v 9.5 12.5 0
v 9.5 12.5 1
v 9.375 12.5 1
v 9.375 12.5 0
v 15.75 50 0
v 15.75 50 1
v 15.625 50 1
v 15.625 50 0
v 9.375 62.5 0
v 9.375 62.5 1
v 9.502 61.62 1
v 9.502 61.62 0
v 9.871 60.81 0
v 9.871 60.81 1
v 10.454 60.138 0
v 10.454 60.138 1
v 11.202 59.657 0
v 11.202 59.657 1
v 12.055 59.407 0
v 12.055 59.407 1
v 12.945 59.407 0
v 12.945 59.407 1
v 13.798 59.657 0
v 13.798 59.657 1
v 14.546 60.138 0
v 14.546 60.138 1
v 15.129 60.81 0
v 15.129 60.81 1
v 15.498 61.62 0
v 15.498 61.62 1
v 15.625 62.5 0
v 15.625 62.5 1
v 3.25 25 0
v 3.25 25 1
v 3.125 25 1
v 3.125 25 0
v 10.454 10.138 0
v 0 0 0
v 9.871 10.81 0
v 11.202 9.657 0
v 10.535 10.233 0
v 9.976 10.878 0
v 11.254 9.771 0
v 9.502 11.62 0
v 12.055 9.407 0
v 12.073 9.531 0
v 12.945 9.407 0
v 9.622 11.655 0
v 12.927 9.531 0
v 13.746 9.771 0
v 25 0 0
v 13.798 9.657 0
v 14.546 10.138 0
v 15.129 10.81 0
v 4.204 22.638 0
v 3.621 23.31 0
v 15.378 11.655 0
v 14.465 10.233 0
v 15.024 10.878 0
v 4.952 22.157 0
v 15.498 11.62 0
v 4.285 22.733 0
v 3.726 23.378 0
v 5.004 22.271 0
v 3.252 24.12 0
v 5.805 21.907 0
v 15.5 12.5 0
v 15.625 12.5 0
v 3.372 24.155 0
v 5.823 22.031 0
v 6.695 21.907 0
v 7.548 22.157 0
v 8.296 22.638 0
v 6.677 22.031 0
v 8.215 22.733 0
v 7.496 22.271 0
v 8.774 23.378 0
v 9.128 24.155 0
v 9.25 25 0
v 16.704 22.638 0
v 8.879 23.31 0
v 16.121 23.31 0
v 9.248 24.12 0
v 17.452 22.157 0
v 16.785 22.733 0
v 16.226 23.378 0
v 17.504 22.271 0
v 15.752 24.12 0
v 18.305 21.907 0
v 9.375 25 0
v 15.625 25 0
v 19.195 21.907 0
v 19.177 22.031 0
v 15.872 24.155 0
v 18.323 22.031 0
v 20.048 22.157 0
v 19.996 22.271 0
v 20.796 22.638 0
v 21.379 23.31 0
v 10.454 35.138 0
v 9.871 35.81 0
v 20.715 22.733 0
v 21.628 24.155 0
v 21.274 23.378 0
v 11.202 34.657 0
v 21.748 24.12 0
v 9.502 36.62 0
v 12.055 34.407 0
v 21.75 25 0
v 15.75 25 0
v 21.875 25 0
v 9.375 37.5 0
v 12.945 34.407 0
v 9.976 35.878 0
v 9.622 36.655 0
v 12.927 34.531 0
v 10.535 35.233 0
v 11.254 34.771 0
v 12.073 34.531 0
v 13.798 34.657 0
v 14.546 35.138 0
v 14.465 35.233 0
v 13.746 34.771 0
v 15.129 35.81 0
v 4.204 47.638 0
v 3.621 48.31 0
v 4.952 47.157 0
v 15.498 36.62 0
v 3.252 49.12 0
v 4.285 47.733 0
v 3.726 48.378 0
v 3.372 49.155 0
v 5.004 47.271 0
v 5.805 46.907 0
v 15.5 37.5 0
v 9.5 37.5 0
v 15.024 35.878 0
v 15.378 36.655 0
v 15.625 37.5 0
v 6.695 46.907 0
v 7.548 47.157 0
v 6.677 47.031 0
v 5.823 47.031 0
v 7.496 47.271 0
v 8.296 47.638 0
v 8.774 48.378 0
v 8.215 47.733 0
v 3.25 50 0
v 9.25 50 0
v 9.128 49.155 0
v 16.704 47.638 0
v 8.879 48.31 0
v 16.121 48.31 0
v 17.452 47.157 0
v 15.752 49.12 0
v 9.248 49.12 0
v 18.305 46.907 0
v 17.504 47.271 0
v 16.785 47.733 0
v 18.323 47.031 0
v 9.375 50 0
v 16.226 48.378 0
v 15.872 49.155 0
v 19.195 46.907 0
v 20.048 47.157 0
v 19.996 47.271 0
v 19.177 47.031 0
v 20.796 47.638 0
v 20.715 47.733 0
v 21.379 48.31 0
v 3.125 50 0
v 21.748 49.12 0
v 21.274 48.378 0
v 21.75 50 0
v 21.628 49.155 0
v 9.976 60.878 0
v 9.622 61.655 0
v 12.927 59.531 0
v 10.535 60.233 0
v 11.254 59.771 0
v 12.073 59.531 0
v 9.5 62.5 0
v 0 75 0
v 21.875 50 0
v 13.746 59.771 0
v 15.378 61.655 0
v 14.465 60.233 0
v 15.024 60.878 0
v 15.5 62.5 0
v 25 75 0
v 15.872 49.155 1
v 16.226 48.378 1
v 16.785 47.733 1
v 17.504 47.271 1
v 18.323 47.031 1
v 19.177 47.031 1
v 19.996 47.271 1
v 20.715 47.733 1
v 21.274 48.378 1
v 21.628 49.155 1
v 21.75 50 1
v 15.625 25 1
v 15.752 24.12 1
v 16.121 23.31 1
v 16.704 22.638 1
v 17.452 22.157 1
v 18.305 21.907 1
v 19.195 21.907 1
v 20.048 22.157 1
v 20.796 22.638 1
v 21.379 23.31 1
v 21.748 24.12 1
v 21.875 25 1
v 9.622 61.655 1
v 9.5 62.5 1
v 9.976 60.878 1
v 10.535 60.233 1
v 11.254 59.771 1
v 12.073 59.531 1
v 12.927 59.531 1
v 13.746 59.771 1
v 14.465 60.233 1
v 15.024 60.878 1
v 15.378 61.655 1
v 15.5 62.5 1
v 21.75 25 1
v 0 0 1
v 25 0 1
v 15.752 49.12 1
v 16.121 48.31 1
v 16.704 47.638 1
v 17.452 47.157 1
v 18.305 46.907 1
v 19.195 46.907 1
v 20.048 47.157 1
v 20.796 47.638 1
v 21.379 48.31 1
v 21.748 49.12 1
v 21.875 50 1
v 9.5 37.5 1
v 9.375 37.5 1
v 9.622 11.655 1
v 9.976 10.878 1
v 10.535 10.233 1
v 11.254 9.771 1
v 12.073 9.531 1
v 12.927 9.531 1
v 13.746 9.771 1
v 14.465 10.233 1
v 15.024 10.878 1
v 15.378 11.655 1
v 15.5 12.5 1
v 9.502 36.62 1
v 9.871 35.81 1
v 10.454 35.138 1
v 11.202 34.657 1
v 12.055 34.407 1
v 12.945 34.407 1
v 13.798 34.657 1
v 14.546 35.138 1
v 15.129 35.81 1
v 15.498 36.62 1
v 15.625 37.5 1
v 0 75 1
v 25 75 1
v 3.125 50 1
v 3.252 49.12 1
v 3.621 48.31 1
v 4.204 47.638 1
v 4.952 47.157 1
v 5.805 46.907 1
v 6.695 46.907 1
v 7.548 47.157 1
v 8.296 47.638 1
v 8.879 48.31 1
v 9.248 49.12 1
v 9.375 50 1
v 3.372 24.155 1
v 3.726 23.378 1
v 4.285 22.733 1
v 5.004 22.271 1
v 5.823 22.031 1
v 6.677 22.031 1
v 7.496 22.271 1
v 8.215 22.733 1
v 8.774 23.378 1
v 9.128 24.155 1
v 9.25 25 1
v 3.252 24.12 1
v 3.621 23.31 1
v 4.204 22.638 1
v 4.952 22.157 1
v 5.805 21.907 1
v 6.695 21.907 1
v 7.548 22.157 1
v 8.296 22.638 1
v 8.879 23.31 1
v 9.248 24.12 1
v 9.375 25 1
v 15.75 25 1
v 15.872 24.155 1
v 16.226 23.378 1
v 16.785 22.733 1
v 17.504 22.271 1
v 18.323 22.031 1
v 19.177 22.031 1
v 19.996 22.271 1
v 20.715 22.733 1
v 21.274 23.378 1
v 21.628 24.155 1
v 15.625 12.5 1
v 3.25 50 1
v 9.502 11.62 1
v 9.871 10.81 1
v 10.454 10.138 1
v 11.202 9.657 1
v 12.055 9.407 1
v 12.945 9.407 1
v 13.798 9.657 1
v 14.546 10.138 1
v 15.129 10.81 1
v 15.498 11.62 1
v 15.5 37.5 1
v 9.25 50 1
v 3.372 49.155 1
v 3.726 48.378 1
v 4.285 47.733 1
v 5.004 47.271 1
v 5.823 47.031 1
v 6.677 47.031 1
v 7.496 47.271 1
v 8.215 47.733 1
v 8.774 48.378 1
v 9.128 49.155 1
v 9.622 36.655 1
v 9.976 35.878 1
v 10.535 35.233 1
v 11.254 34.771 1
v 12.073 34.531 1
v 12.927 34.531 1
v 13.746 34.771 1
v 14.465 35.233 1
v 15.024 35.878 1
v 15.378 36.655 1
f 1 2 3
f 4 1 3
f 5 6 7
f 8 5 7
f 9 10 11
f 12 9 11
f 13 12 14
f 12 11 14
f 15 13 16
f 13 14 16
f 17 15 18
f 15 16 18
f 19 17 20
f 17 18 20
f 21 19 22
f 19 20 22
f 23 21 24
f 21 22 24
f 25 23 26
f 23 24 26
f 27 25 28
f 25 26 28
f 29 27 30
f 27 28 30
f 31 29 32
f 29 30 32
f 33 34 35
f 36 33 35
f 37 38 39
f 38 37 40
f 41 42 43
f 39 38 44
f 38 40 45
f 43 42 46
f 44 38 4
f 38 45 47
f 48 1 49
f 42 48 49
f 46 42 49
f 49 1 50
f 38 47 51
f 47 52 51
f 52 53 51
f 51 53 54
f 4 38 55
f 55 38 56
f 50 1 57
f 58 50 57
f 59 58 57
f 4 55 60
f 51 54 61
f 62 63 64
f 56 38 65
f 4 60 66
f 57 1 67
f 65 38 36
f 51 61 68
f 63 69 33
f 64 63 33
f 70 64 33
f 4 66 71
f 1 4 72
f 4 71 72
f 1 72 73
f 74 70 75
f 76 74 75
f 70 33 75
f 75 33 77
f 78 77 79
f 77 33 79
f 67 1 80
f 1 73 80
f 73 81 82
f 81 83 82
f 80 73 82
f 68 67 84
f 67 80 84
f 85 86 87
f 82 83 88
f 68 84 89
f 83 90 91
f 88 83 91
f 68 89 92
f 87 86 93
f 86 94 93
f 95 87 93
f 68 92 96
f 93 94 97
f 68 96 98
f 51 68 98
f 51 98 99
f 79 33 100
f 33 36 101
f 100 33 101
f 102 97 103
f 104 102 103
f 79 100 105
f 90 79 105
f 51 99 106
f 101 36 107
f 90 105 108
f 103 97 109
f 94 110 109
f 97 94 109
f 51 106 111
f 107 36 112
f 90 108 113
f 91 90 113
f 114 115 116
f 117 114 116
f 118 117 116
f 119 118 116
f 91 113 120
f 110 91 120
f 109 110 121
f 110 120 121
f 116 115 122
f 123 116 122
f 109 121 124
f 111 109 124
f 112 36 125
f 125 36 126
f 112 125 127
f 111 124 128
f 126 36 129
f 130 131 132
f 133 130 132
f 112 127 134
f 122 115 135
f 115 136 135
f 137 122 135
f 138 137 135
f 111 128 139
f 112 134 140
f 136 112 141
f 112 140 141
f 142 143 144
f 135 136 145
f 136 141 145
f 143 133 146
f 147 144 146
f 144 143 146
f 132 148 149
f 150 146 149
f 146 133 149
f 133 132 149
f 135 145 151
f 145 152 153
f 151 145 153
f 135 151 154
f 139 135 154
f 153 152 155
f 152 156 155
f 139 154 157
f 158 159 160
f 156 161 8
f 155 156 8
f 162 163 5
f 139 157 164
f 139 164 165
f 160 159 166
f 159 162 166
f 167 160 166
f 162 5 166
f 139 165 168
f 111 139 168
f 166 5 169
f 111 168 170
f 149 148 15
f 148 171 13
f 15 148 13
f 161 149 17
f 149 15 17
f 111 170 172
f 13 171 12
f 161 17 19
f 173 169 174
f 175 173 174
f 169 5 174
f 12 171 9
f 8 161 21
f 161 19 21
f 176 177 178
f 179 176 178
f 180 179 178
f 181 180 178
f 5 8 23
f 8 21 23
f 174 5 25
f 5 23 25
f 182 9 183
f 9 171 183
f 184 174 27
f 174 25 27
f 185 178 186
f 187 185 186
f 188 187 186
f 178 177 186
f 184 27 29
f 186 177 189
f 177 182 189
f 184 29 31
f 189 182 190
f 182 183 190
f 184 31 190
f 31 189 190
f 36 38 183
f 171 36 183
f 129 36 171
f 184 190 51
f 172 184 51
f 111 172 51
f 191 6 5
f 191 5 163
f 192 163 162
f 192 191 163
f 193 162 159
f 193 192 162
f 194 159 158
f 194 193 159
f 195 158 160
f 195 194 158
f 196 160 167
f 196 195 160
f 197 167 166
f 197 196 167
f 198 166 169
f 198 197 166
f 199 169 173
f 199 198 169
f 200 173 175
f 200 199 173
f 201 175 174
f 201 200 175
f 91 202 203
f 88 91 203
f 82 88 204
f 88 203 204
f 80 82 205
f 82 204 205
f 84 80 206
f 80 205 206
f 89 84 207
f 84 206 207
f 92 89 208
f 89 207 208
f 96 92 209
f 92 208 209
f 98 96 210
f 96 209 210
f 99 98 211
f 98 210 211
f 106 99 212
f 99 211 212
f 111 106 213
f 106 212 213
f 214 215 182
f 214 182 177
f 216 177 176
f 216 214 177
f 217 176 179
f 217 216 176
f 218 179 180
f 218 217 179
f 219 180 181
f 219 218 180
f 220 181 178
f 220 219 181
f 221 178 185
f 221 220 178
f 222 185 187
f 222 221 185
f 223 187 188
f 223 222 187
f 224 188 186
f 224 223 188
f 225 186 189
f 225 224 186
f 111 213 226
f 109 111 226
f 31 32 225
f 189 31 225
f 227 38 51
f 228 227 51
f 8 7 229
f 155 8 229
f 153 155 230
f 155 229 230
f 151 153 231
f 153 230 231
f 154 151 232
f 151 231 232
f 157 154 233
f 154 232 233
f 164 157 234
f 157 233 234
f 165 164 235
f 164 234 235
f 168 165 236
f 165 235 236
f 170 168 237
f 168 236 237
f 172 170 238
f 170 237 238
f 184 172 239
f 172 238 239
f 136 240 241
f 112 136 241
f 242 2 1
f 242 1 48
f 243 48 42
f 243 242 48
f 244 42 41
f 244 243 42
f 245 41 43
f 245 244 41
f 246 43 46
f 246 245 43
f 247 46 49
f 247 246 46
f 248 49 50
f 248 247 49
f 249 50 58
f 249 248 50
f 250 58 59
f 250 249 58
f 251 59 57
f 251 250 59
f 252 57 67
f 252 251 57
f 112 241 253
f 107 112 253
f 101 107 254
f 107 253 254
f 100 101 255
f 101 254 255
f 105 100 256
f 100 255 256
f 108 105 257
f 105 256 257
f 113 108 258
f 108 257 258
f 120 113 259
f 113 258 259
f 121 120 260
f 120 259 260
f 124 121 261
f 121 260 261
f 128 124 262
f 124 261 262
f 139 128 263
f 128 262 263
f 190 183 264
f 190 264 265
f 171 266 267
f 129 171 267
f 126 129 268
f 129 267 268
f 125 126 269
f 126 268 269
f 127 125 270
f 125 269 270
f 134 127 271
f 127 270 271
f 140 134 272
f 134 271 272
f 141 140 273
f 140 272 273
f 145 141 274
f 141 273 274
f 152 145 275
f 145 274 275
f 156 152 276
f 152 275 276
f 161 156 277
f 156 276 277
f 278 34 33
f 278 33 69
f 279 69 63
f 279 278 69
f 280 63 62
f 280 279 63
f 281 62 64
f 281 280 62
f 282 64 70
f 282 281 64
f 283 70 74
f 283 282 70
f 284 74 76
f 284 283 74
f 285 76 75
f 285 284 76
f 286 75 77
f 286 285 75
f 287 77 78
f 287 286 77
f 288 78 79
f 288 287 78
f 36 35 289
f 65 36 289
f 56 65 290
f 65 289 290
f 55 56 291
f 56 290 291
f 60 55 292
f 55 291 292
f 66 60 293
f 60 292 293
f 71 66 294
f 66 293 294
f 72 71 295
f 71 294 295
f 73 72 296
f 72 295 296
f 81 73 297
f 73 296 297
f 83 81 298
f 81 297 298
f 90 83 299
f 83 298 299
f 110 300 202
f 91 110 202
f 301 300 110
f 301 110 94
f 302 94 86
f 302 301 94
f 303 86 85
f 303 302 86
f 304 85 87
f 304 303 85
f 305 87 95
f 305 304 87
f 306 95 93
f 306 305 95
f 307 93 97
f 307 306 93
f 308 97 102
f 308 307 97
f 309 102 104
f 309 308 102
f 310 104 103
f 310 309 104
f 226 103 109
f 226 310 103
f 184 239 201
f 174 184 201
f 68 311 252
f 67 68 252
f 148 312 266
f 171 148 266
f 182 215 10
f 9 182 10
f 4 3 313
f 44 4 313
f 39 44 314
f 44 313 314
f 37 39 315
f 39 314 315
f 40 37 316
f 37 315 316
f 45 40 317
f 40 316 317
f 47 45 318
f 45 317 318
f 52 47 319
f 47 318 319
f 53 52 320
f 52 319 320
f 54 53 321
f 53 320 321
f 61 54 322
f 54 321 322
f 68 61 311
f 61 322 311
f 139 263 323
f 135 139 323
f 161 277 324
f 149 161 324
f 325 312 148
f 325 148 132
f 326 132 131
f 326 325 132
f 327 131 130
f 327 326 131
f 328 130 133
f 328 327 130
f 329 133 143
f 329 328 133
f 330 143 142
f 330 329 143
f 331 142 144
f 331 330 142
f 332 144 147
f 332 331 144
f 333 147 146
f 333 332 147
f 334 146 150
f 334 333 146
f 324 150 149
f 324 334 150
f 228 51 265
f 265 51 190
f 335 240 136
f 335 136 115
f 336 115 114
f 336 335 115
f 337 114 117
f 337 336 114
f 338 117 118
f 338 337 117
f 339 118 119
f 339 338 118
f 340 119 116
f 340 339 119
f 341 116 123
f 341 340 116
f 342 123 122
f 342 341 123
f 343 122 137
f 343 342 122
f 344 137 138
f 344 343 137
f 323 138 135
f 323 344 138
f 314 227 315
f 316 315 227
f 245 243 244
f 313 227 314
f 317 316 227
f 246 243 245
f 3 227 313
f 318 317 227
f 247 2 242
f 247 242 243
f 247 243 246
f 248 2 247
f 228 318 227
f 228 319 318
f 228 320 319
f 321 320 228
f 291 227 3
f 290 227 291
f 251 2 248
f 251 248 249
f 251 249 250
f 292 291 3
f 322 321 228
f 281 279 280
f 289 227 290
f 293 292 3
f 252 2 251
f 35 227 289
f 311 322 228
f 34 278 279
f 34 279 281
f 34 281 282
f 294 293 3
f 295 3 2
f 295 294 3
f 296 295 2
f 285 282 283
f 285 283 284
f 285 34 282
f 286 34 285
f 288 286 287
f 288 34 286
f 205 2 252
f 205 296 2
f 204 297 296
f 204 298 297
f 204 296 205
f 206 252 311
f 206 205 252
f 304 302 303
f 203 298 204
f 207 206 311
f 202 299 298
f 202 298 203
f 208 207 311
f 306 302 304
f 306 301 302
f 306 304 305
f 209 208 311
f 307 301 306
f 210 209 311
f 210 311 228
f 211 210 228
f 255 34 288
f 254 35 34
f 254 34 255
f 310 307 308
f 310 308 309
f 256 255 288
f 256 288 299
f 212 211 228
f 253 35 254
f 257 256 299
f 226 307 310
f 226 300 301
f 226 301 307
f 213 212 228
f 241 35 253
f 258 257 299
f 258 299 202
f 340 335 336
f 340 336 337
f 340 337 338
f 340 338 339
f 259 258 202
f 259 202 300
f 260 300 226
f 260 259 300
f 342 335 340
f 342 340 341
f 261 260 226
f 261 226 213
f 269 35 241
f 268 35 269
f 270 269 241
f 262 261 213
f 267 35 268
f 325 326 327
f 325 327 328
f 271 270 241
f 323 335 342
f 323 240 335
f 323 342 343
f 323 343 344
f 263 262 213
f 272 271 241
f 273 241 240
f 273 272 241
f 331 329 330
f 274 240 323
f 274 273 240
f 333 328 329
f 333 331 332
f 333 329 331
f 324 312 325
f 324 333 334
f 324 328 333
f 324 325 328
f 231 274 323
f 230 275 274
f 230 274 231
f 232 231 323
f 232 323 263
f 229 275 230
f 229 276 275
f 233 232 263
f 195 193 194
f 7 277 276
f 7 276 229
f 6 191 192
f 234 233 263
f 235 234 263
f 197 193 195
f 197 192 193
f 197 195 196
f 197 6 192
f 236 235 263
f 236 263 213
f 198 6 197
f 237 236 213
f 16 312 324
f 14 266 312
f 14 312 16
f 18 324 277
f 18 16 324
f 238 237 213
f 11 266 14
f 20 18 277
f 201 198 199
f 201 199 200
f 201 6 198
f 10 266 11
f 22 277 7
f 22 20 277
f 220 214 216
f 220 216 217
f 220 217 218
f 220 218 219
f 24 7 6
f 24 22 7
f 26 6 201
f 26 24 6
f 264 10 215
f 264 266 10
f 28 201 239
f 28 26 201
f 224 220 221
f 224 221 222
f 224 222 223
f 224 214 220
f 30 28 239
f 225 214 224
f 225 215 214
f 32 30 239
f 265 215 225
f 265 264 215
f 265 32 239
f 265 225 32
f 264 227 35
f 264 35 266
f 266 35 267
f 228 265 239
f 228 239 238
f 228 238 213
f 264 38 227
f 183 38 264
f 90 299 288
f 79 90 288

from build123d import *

# Parameters (mm, degrees)
PAD030_DEPTH = 5
PAD028_DEPTH = 5
PAD026_DEPTH = 5
PAD027_DEPTH = 5
PAD029_DEPTH = 5
PAD031_DEPTH = 5
PAD032_DEPTH = 5
SKETCH024_W  = 25
SKETCH024_H  = 75
PAD023_DEPTH = 1


with BuildPart() as pattern005:
    # Sketch033 → Pad030 (new body, symmetric)
    with BuildSketch(Plane.XY):
        with BuildLine():
            ThreePointArc((3.125, 50), (6.25, 46.875), (9.375, 50))
            Line((9.375, 50), (9.25, 50))
            ThreePointArc((3.25, 50), (6.25, 47), (9.25, 50))
            Line((3.25, 50), (3.125, 50))
        make_face()
    extrude(amount=PAD030_DEPTH, both=True)


with BuildPart() as pattern003:
    # Sketch031 → Pad028 (new body, symmetric)
    with BuildSketch(Plane.XY):
        with BuildLine():
            ThreePointArc((15.625, 25), (18.75, 21.875), (21.875, 25))
            Line((21.875, 25), (21.75, 25))
            ThreePointArc((15.75, 25), (18.75, 22), (21.75, 25))
            Line((15.75, 25), (15.625, 25))
        make_face()
    extrude(amount=PAD028_DEPTH, both=True)


with BuildPart() as pattern001:
    # Sketch027 → Pad026 (new body, symmetric)
    with BuildSketch(Plane.XY):
        with BuildLine():
            ThreePointArc((9.375, 12.5), (12.5, 9.375), (15.625, 12.5))
            Line((15.625, 12.5), (15.5, 12.5))
            ThreePointArc((9.5, 12.5), (12.5, 9.5), (15.5, 12.5))
            Line((9.5, 12.5), (9.375, 12.5))
        make_face()
    extrude(amount=PAD026_DEPTH, both=True)


with BuildPart() as pattern002:
    # Sketch029 → Pad027 (new body, symmetric)
    with BuildSketch(Plane.XY):
        with BuildLine():
            ThreePointArc((3.125, 25), (6.25, 21.875), (9.375, 25))
            Line((9.375, 25), (9.25, 25))
            ThreePointArc((3.25, 25), (6.25, 22), (9.25, 25))
            Line((3.25, 25), (3.125, 25))
        make_face()
    extrude(amount=PAD027_DEPTH, both=True)


with BuildPart() as pattern004:
    # Sketch032 → Pad029 (new body, symmetric)
    with BuildSketch(Plane.XY):
        with BuildLine():
            ThreePointArc((9.375, 37.5), (12.5, 34.375), (15.625, 37.5))
            Line((15.625, 37.5), (15.5, 37.5))
            ThreePointArc((9.5, 37.5), (12.5, 34.5), (15.5, 37.5))
            Line((9.5, 37.5), (9.375, 37.5))
        make_face()
    extrude(amount=PAD029_DEPTH, both=True)


with BuildPart() as pattern006:
    # Sketch034 → Pad031 (new body, symmetric)
    with BuildSketch(Plane.XY):
        with BuildLine():
            ThreePointArc((15.625, 50), (18.75, 46.875), (21.875, 50))
            Line((21.875, 50), (21.75, 50))
            ThreePointArc((15.75, 50), (18.75, 47), (21.75, 50))
            Line((15.75, 50), (15.625, 50))
        make_face()
    extrude(amount=PAD031_DEPTH, both=True)


with BuildPart() as pattern007:
    # Sketch035 → Pad032 (new body, symmetric)
    with BuildSketch(Plane.XY):
        with BuildLine():
            ThreePointArc((9.375, 62.5), (12.5, 59.375), (15.625, 62.5))
            Line((15.625, 62.5), (15.5, 62.5))
            ThreePointArc((9.5, 62.5), (12.5, 59.5), (15.5, 62.5))
            Line((9.5, 62.5), (9.375, 62.5))
        make_face()
    extrude(amount=PAD032_DEPTH, both=True)


with BuildPart() as body022:
    # Sketch024 → Pad023 (new body)
    with BuildSketch(Plane.XY):
        with Locations((12.5, 37.5)):
            Rectangle(SKETCH024_W, SKETCH024_H)
    extrude(amount=PAD023_DEPTH)

    # Boolean006: cut pattern005, pattern003, pattern001, pattern002, pattern004, pattern006, pattern007
    add(pattern005.part, mode=Mode.SUBTRACT)
    add(pattern003.part, mode=Mode.SUBTRACT)
    add(pattern001.part, mode=Mode.SUBTRACT)
    add(pattern002.part, mode=Mode.SUBTRACT)
    add(pattern004.part, mode=Mode.SUBTRACT)
    add(pattern006.part, mode=Mode.SUBTRACT)
    add(pattern007.part, mode=Mode.SUBTRACT)


solid = body022.part
